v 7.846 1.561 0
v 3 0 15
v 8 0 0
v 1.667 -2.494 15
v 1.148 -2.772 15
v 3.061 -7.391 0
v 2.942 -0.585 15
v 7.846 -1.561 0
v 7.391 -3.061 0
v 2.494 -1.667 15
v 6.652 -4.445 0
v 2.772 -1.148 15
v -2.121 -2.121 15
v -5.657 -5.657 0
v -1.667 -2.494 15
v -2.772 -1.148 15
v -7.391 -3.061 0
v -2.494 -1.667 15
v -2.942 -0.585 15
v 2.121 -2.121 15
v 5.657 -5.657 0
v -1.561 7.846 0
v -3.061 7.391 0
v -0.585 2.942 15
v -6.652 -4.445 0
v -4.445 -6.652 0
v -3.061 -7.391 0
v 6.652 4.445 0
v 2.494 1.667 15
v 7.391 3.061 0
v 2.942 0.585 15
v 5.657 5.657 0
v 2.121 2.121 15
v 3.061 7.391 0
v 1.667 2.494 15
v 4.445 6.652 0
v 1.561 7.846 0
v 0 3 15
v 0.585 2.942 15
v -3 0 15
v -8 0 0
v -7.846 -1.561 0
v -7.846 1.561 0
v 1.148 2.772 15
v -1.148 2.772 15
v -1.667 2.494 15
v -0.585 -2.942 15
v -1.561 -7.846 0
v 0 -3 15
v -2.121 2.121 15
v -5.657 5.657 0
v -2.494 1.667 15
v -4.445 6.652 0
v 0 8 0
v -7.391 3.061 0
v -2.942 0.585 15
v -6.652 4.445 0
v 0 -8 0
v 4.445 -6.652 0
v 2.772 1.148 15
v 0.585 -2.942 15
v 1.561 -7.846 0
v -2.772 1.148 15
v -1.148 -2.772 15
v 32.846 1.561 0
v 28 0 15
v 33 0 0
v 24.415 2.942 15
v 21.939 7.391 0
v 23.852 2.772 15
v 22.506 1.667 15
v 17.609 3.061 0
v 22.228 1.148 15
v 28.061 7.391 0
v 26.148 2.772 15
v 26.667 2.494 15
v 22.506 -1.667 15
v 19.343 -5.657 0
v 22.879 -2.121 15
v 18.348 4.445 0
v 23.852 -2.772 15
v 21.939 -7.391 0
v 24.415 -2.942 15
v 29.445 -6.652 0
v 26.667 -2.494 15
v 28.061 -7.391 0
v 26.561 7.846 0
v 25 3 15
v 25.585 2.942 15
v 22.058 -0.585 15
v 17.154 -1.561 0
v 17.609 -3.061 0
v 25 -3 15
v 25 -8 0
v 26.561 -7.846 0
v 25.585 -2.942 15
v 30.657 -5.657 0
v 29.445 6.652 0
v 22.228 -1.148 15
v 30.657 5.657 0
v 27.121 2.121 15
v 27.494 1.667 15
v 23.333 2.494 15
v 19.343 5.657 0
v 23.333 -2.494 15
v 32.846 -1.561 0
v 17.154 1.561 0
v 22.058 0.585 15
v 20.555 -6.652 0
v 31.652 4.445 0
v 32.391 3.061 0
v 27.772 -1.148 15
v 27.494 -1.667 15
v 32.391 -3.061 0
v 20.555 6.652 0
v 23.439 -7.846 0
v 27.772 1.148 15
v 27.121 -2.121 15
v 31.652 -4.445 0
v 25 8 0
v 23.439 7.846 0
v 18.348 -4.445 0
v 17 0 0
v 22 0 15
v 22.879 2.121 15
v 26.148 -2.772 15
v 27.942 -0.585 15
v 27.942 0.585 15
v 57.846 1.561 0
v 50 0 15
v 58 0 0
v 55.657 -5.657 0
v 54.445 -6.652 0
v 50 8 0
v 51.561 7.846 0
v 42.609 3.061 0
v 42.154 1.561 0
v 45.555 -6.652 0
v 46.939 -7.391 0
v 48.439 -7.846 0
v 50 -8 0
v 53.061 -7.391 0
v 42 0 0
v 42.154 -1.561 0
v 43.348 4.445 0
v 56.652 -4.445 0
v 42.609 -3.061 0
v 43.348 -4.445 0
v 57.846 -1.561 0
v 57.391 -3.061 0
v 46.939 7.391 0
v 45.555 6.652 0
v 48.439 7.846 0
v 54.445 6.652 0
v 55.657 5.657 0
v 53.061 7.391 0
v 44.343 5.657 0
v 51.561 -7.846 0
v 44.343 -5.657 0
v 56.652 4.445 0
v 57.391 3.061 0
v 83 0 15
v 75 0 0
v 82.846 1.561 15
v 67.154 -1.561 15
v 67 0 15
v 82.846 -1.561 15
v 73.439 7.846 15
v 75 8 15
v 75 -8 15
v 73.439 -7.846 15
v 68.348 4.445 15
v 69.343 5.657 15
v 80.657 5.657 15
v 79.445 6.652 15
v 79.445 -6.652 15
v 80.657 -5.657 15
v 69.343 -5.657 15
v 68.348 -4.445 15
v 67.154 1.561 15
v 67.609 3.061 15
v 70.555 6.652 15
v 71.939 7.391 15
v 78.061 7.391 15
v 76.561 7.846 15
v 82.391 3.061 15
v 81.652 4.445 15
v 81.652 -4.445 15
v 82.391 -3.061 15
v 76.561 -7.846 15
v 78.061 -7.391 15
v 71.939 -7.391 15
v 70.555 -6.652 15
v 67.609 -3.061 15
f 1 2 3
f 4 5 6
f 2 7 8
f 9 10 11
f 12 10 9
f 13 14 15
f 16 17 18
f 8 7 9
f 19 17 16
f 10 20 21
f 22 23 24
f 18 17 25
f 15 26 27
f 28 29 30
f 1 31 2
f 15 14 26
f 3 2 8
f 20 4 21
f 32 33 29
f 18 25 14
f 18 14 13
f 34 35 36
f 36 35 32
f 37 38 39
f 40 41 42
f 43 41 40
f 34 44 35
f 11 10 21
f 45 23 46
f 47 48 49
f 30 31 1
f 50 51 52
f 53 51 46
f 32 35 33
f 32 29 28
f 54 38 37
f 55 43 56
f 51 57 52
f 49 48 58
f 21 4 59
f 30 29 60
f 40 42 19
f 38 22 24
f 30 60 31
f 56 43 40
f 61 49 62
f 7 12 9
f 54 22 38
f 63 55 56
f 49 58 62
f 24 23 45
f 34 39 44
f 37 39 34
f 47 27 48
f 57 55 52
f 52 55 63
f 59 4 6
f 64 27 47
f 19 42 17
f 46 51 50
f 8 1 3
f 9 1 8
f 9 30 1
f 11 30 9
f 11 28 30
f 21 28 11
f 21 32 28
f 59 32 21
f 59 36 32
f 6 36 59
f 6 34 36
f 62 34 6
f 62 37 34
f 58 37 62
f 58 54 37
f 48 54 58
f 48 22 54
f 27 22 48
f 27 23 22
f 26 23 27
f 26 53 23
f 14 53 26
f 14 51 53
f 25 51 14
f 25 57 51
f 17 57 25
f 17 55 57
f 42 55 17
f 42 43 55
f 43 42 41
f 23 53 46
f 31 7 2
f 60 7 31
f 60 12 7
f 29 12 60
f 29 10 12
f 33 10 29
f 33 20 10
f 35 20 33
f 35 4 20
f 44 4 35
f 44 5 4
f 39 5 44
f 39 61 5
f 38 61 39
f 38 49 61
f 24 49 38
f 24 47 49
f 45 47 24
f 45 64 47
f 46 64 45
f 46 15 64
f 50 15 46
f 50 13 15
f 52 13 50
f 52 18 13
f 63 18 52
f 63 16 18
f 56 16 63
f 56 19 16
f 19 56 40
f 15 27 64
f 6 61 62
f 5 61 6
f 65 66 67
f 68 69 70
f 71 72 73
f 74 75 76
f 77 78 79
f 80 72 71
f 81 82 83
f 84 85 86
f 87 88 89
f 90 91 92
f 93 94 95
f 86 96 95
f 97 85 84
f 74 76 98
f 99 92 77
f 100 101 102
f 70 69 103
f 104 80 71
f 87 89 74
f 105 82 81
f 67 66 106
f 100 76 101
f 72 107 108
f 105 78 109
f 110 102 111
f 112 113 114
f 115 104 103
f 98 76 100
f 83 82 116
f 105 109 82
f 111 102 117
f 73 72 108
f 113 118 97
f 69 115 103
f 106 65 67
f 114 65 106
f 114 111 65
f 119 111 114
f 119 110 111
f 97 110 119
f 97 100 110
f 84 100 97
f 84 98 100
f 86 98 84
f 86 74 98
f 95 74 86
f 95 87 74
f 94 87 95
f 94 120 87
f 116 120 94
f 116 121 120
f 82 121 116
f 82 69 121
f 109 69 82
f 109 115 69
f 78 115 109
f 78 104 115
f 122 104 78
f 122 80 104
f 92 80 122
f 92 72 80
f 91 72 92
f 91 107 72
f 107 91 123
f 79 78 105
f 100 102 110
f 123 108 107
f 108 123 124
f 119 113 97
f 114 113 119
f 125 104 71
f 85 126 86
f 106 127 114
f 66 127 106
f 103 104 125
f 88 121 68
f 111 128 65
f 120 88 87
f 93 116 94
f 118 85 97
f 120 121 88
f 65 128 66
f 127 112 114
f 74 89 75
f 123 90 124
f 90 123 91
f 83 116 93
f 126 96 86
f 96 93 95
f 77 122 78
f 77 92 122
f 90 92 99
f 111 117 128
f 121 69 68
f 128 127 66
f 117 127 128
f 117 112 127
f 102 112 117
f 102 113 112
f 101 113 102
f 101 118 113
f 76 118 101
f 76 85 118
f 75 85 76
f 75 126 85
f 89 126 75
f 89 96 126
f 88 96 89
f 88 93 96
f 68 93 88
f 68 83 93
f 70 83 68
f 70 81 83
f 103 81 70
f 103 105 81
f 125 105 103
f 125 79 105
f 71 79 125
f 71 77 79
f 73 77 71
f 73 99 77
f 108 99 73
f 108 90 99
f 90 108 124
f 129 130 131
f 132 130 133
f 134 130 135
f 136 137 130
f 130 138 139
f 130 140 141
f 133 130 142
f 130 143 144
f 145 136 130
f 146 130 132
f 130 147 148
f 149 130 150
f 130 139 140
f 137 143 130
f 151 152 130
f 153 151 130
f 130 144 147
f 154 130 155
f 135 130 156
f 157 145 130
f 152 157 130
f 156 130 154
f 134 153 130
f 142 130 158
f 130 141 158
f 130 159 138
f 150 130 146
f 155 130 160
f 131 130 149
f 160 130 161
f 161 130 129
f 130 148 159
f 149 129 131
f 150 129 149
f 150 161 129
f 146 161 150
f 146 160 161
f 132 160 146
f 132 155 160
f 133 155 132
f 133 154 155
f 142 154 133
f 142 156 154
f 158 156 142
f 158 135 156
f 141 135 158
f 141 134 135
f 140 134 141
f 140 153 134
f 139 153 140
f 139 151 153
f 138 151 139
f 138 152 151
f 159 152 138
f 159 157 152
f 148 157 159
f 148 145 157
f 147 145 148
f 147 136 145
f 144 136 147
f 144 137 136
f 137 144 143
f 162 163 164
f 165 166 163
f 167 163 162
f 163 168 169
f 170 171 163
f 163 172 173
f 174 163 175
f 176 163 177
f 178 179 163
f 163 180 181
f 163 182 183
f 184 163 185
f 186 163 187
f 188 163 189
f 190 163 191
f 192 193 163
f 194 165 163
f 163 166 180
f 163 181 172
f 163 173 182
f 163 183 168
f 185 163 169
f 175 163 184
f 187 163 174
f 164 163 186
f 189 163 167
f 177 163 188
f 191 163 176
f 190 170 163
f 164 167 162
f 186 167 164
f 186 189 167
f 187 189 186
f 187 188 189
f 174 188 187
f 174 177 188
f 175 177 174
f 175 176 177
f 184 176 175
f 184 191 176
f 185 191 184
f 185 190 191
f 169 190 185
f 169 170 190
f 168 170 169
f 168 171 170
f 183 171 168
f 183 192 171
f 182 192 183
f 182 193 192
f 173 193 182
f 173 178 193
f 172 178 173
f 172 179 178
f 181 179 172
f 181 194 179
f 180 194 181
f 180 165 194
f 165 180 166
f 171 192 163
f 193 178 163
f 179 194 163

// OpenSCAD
// TEST 13: Cone (cylinder with r1/r2 or d1/d2)
// Expected: 4 cone variants side by side.
// Check: r1/r2 shows R1/R2 labels in card; d1/d2 shows D1/D2.
// Check: roundtrip d1= back to code outputs d1= not r1=.

$fn = 32;

// r1/r2 notation
translate([0, 0, 0]) {
    cylinder(h=15, r1=8, r2=3);
}

// d1/d2 notation — card should show D1=16, D2=6
translate([25, 0, 0]) {
    cylinder(h=15, d1=16, d2=6);
}

// r1=0 = pointed cone
translate([50, 0, 0]) {
    cylinder(h=15, r1=8, r2=0);
}

// r2=0, flipped (bigger top)
translate([75, 0, 0]) {
    cylinder(h=15, r1=0, r2=8);
}
